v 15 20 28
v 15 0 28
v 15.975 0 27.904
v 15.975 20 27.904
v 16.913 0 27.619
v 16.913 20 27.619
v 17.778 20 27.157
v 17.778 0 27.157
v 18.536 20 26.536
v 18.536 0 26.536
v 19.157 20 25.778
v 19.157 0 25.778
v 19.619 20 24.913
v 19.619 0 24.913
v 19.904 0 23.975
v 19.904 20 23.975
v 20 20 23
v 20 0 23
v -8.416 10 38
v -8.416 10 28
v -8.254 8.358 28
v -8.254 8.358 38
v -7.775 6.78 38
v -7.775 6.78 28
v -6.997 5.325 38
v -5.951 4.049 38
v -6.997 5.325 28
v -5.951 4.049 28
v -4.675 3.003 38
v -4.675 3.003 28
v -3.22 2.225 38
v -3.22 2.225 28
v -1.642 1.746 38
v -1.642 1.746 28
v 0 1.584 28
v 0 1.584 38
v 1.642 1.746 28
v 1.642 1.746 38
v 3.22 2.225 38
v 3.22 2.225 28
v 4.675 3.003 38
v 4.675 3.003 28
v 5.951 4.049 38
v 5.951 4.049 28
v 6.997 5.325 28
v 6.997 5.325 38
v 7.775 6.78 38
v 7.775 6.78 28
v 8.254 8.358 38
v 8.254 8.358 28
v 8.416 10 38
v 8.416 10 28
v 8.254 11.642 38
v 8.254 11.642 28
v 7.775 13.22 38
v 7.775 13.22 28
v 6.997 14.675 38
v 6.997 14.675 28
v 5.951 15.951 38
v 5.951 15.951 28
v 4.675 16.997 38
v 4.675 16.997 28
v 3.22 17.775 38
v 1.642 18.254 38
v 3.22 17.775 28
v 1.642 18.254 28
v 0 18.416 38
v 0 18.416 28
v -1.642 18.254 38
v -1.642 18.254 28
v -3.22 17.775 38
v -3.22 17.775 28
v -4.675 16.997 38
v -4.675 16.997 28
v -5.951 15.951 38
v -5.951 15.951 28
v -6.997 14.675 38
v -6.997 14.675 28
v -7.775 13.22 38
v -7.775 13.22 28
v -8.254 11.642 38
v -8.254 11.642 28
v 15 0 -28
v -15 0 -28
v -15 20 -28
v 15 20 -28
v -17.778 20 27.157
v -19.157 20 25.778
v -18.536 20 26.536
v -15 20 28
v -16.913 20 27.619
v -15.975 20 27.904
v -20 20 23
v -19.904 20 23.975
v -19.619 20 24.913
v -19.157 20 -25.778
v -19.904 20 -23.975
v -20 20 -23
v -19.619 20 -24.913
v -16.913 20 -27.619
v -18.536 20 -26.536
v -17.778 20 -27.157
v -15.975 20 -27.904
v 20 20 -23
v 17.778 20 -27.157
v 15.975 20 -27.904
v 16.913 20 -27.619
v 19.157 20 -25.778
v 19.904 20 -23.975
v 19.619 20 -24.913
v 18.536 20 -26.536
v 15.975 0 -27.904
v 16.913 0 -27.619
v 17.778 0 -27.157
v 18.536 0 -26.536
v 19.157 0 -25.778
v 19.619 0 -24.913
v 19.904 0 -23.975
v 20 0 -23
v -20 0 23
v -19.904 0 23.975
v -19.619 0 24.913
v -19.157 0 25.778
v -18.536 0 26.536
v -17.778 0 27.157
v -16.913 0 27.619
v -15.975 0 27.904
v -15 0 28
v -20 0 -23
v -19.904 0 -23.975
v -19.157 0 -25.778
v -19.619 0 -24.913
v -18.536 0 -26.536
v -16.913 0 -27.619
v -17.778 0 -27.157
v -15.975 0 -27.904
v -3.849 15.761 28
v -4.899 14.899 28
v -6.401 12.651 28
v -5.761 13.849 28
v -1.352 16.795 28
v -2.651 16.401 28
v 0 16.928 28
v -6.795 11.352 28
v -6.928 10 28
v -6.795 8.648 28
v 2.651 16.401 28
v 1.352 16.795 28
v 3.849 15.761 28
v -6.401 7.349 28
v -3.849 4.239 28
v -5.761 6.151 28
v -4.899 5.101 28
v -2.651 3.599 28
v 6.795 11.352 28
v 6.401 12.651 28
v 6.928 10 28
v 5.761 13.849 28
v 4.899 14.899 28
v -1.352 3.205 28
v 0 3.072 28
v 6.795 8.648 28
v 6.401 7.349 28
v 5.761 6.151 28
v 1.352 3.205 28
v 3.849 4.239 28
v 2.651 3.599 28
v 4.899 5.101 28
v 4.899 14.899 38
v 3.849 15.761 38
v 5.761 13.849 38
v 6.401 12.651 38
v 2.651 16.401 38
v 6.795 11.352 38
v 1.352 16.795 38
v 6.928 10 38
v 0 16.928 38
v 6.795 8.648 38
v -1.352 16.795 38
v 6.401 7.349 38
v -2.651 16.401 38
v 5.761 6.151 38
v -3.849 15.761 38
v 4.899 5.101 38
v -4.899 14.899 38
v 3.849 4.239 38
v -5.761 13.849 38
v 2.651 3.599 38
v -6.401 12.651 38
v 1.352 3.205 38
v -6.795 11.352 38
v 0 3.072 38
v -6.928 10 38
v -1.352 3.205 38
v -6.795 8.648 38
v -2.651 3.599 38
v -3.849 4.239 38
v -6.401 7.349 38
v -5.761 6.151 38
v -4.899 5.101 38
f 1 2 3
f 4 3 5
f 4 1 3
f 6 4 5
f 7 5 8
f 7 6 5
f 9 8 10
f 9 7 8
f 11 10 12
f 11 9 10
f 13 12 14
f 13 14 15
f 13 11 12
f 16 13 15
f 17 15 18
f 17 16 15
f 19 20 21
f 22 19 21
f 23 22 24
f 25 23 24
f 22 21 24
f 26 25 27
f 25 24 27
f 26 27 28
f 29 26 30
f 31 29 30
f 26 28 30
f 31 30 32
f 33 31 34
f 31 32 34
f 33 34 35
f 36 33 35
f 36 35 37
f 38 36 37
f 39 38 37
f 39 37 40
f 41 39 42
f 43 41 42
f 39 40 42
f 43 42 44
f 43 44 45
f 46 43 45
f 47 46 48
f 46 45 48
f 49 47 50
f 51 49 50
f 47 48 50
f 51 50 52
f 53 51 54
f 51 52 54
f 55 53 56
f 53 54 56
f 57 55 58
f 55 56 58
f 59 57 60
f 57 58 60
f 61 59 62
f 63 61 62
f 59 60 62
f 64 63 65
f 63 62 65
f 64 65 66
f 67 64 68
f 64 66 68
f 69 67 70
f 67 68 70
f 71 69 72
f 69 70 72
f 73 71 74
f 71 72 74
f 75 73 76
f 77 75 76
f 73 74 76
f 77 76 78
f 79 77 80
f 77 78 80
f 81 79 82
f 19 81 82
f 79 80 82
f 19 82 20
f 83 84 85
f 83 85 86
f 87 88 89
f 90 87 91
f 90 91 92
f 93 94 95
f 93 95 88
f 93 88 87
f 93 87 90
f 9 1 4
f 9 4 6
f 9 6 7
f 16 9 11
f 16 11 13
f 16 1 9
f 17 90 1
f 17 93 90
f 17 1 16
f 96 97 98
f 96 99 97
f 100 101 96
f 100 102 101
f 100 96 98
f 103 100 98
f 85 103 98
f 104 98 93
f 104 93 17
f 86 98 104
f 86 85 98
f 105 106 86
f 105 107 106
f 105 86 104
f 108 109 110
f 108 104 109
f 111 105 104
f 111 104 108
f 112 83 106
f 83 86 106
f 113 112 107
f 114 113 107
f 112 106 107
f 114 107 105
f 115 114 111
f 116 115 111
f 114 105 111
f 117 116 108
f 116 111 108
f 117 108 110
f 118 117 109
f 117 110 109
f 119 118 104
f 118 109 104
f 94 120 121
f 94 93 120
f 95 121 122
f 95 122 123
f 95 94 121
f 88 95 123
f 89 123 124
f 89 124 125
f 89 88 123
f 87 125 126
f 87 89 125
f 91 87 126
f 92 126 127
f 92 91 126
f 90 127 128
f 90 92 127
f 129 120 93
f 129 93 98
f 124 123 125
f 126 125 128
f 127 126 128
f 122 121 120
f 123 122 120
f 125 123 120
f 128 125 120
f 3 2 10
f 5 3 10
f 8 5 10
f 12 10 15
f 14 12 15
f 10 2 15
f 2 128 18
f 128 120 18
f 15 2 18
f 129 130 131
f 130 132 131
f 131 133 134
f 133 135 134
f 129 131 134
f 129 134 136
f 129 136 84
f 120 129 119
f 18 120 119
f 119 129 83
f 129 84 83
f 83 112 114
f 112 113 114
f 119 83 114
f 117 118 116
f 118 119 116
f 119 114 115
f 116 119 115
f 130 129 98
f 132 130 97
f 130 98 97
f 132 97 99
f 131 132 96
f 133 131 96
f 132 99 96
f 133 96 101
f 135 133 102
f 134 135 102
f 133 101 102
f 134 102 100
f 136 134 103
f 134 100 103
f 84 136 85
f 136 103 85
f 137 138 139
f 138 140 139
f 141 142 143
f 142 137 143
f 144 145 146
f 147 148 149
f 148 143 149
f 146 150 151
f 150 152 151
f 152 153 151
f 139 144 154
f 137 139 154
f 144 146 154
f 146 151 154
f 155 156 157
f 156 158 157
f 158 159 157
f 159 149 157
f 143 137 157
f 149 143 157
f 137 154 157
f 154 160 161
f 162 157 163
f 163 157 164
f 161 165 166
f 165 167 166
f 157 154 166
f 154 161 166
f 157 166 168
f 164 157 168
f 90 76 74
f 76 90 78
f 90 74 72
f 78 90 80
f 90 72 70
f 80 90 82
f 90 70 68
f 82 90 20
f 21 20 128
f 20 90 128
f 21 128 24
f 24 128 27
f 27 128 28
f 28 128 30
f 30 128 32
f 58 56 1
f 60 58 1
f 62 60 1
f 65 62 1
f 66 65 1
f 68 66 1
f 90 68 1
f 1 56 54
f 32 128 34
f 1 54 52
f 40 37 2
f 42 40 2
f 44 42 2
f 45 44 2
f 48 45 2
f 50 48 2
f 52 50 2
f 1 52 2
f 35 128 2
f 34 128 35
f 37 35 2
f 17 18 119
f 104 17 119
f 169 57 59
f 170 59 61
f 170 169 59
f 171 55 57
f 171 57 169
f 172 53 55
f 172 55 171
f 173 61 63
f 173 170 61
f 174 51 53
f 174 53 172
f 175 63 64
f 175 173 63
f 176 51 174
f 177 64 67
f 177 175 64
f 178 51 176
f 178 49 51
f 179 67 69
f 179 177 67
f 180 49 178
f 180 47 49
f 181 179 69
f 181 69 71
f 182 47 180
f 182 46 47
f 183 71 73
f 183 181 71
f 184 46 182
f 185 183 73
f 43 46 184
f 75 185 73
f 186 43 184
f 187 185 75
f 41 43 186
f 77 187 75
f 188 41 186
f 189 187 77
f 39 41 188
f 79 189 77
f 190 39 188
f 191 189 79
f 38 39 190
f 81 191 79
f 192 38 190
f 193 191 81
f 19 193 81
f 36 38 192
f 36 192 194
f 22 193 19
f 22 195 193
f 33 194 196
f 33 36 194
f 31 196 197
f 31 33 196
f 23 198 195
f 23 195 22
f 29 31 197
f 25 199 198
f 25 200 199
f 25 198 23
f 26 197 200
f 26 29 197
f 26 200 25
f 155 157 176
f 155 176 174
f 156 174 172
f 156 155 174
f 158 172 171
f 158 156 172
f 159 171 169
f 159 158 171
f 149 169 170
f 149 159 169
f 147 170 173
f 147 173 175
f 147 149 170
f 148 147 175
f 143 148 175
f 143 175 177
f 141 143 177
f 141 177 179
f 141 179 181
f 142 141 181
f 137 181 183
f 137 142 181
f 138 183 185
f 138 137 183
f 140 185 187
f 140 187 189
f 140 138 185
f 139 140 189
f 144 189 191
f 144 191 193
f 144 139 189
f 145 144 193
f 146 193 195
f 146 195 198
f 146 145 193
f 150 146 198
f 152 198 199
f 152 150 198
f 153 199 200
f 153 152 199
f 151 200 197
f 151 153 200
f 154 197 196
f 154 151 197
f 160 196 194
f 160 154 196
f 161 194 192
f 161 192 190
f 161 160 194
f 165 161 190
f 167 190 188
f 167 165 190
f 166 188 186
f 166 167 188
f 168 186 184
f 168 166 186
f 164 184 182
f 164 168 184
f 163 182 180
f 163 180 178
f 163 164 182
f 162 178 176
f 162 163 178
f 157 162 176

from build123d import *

# Parameters (mm, degrees)
SKETCH_2_W      = 40
SKETCH_2_H      = 56
EXTRUDE_1_DEPTH = 20
SKETCH_3_R      = 8.41555303
SKETCH_3_R_2    = 6.928356998
EXTRUDE_2_DEPTH = 10
FILLET_1_R      = 5


with BuildPart() as part:
    # 草图2 → 凸台-拉伸1 (new body)
    with BuildSketch(Plane(origin=(0, 0, 0), x_dir=(1, 0, 0), z_dir=(0, 1, 0))):
        Rectangle(SKETCH_2_W, SKETCH_2_H)
    extrude(amount=EXTRUDE_1_DEPTH)

    # 草图3 → 凸台-拉伸2 (add)
    with BuildSketch(Plane.XY.offset(28)):
        with Locations(Location((0, 10, 0), (0, 0, 180))):
            Circle(SKETCH_3_R)
        with Locations((0, 10)):
            Circle(SKETCH_3_R_2, mode=Mode.SUBTRACT)
    extrude(amount=EXTRUDE_2_DEPTH)

    # 圆角1
    fillet_1_edges = [part.edges().sort_by_distance(p)[0] for p in [
        (20, 10, 28),
        (-20, 10, 28),
        (-20, 10, -28),
        (20, 10, -28),
    ]]
    fillet(fillet_1_edges, radius=FILLET_1_R)


solid = part.part
